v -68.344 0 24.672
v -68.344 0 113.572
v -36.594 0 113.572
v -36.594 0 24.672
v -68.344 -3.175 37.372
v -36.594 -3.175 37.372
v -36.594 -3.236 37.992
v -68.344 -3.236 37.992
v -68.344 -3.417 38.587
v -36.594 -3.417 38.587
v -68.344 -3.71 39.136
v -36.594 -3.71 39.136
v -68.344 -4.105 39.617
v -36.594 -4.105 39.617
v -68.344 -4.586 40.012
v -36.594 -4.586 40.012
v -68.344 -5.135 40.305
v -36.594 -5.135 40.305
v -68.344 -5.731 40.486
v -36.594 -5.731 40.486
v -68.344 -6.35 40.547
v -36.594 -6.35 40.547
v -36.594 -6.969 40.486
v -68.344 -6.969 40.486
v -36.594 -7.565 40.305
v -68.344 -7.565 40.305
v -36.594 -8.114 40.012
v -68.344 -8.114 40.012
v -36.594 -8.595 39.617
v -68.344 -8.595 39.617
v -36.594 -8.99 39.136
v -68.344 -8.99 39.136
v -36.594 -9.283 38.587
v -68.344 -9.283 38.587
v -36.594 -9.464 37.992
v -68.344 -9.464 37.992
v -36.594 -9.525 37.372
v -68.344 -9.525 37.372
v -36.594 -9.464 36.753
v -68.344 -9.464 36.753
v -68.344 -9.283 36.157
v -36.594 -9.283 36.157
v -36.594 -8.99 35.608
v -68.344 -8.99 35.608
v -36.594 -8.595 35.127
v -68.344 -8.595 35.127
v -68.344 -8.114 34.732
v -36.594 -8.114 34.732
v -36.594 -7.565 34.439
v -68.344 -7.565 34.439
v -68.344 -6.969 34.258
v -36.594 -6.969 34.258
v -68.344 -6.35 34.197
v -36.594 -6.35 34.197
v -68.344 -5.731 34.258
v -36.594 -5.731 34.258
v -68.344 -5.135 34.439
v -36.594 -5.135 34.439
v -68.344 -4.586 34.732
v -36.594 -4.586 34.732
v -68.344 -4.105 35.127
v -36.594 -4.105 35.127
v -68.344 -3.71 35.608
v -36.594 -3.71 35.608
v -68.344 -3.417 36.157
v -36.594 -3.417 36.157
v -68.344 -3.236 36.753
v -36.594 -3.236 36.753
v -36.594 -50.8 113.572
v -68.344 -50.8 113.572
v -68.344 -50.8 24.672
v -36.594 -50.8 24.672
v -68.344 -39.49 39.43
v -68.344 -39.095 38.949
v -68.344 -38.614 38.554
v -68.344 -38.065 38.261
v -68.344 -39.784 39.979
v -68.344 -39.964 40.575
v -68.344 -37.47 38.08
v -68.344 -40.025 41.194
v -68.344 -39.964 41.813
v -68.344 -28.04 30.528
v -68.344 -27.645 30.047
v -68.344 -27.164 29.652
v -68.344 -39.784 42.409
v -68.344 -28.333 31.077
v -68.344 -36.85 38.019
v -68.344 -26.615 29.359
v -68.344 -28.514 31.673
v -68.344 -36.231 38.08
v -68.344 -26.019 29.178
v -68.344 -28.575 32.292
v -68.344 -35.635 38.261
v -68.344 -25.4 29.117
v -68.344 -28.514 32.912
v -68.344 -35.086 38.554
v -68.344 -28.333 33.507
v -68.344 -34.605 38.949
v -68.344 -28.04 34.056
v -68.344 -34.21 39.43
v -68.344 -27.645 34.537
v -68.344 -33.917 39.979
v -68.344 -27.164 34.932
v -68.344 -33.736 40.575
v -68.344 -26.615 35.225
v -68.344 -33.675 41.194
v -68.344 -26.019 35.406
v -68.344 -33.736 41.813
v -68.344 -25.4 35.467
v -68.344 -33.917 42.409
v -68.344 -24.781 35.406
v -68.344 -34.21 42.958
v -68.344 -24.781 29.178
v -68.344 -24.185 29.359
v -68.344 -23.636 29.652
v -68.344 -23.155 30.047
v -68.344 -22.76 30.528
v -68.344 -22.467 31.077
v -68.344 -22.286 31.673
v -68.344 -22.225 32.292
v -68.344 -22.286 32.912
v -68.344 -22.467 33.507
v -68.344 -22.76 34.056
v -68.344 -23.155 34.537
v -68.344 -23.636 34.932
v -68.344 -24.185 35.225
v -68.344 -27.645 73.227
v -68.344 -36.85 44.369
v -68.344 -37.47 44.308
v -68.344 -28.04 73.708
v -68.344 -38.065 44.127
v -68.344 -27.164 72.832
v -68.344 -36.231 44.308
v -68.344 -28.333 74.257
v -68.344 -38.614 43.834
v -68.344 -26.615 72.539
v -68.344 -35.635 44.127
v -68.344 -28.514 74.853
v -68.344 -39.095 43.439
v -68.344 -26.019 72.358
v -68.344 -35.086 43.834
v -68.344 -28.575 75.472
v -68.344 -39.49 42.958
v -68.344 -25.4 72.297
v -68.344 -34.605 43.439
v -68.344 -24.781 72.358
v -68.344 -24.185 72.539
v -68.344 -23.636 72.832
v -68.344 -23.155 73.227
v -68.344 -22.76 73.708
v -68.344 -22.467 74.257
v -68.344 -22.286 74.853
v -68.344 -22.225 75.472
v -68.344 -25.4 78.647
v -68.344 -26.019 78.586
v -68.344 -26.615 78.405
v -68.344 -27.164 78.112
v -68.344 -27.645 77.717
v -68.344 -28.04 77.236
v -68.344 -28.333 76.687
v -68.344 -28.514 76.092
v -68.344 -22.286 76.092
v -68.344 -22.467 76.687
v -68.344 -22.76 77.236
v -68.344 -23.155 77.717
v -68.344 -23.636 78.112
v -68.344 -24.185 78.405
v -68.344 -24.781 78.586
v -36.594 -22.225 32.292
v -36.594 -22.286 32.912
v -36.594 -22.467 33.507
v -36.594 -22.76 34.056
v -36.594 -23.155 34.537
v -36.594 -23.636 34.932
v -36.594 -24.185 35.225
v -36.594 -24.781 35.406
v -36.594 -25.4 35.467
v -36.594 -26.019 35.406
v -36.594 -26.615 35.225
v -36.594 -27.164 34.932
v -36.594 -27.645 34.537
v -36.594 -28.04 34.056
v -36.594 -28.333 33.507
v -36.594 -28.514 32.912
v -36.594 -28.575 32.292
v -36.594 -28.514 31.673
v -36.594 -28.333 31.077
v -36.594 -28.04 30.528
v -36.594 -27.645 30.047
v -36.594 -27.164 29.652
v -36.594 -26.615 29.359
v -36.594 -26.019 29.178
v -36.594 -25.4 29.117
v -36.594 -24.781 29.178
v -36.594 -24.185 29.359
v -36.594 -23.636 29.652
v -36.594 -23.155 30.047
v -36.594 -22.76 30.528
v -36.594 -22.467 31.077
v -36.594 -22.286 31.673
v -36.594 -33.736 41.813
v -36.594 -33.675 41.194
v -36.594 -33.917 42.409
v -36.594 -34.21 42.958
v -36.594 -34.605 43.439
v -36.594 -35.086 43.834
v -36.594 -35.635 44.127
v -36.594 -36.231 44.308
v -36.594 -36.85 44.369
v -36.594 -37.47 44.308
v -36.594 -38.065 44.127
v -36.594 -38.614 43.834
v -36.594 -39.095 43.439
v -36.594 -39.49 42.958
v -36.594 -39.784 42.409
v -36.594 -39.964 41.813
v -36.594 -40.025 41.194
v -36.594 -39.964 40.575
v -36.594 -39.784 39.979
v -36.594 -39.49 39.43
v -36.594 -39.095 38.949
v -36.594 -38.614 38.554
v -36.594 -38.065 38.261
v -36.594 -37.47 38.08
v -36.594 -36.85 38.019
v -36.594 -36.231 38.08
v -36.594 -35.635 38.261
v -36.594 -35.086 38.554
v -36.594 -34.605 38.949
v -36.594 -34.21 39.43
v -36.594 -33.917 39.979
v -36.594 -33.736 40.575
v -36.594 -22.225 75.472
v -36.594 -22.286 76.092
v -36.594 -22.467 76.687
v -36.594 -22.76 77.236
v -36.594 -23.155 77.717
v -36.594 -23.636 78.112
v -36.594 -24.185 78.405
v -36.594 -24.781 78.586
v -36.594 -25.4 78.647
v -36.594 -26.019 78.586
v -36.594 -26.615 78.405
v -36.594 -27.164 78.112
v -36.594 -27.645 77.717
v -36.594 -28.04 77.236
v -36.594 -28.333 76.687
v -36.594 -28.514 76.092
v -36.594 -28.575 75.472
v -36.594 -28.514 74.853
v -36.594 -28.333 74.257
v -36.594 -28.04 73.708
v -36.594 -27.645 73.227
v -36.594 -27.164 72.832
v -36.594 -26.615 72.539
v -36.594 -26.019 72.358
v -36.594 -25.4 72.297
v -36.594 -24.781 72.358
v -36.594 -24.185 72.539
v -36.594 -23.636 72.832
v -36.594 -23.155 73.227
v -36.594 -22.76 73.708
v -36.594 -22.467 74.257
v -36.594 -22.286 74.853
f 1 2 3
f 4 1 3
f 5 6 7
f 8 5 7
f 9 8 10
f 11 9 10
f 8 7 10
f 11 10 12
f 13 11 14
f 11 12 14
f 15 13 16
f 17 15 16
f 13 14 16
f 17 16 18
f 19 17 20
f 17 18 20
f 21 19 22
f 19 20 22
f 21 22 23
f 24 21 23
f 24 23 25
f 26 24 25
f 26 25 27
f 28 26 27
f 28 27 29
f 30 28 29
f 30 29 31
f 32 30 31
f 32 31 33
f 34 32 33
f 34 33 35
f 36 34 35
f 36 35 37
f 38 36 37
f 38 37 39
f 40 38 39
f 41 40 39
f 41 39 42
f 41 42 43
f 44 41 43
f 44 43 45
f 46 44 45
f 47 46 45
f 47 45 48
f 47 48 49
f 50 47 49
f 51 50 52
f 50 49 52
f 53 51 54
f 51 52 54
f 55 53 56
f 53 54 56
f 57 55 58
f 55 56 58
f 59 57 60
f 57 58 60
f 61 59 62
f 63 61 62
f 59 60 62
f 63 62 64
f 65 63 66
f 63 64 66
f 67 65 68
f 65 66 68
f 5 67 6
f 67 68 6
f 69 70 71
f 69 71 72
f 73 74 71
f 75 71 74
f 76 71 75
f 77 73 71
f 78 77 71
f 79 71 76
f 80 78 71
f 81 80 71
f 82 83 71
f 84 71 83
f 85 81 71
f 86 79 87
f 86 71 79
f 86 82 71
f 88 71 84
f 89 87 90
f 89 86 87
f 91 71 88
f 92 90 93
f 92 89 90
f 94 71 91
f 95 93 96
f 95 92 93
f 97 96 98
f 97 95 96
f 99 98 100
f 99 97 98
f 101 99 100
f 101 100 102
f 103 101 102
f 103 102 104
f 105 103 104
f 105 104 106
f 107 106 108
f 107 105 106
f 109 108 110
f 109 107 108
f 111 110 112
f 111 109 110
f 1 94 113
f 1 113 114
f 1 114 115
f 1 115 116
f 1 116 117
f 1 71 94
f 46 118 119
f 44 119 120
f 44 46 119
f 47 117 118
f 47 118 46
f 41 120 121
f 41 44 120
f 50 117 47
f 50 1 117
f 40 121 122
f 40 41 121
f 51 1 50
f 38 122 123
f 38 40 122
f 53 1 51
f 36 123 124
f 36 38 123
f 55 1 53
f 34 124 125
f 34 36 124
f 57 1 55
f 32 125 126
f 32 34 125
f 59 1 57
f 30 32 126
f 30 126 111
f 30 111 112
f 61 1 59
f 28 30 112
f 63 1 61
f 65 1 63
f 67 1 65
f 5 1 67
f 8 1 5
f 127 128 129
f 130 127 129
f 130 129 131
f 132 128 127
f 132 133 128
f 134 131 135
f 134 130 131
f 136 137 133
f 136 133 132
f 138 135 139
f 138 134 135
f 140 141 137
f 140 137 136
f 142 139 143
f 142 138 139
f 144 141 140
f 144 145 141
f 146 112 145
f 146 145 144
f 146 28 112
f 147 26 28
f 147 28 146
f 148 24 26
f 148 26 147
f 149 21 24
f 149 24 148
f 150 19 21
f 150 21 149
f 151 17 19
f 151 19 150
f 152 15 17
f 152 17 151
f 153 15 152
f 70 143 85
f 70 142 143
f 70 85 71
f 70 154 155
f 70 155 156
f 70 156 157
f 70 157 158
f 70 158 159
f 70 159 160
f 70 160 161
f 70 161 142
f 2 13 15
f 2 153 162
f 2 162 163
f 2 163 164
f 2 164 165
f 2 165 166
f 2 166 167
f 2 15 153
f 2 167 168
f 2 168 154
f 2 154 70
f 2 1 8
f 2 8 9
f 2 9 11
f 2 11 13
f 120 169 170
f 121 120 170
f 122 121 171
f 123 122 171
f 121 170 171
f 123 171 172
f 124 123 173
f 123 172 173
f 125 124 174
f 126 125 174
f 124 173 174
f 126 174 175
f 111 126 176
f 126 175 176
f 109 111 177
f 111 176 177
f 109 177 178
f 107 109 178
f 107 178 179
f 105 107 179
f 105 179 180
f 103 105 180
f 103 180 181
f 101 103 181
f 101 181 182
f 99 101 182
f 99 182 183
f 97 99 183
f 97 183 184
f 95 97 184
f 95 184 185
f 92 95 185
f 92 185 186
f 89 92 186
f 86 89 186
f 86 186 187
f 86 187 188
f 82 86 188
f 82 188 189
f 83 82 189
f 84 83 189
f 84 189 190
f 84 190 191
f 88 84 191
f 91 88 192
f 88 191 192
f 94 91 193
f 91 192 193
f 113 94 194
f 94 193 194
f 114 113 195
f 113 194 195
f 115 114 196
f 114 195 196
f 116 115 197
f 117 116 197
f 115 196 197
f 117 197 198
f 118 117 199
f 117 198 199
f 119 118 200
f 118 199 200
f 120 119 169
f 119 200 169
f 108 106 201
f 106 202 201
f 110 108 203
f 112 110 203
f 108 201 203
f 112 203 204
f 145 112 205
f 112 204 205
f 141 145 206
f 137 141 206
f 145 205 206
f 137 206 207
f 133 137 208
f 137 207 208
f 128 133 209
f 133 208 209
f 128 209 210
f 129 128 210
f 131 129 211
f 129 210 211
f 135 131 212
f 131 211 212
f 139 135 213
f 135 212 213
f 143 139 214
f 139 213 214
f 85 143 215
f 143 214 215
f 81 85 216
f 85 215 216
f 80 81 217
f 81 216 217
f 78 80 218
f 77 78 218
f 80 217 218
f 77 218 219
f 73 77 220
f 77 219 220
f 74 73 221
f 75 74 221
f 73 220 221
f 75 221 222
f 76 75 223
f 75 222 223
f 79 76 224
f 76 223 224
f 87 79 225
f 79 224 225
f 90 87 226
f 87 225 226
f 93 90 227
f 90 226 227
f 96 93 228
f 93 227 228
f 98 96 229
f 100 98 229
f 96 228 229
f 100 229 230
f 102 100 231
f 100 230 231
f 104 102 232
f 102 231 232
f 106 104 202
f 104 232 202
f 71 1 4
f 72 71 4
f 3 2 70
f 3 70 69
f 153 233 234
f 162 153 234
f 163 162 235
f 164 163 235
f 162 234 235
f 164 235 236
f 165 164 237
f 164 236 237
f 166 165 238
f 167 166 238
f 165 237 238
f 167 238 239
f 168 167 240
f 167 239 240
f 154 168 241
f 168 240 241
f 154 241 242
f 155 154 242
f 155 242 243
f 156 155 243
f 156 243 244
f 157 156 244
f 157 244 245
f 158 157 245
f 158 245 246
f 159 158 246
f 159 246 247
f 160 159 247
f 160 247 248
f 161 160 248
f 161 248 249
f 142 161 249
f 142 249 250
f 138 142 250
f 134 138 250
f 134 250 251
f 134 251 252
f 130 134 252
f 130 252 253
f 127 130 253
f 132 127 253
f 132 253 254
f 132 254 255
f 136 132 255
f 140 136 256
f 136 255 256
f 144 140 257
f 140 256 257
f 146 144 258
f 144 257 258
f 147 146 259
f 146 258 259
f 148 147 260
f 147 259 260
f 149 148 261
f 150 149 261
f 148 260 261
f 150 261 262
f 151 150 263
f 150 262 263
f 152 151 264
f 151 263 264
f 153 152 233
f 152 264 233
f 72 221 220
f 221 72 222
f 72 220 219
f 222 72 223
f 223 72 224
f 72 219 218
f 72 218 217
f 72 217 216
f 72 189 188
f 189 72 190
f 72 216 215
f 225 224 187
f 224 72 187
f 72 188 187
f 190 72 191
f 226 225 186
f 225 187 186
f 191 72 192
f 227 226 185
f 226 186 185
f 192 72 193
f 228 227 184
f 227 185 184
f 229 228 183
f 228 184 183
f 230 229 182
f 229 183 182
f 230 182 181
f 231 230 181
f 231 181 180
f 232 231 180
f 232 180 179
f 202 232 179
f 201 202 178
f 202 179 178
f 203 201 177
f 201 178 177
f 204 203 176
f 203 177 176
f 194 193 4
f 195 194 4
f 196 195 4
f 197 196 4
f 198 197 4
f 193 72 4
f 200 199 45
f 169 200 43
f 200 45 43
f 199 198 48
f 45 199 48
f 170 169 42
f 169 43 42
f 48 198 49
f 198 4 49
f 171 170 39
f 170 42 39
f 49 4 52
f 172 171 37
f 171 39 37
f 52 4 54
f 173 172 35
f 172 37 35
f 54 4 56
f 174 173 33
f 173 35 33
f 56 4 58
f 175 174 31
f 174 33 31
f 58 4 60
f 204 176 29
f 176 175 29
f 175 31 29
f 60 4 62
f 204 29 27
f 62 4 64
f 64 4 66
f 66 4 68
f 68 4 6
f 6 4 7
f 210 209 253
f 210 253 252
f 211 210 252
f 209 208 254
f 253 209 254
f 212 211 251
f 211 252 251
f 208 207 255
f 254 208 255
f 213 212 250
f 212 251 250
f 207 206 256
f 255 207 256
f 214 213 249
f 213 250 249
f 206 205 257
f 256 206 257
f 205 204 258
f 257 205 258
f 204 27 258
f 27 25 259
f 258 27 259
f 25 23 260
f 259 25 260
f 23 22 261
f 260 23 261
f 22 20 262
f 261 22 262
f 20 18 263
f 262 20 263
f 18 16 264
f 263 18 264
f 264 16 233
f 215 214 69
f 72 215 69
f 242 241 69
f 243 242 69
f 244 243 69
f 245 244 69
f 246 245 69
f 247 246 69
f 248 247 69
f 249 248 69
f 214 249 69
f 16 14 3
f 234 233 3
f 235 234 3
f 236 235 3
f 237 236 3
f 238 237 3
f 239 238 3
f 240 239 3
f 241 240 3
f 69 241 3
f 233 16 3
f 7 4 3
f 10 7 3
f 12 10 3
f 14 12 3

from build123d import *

# Parameters (mm, degrees)
F0_W     = 31.75
F0_H     = 88.9
F1_DEPTH = 50.8
F2_R     = 3.175
F3_DEPTH = 76.2
F4_R     = 3.175
F5_DEPTH = 25.4
F6_DEPTH = 38.1


with BuildPart() as f1:
    # F0 (on Front) → F1 (new body)
    with BuildSketch(Plane.XZ):
        with Locations((-52.468664, 69.122105)):
            Rectangle(F0_W, F0_H)
    extrude(amount=F1_DEPTH)

    # F2 (on face) → F3 (cut)
    with BuildSketch(Plane.YZ.offset(-36.593664)):
        with Locations((-25.4, 75.472105)):
            Circle(F2_R)
        with Locations((-25.4, 32.292105)):
            Circle(F2_R)
        with Locations((-6.35, 37.372105)):
            Circle(F2_R)
    extrude(amount=-F3_DEPTH, mode=Mode.SUBTRACT)

    # F4 (on face) → F5 (cut)
    with BuildSketch(Plane.YZ.offset(-36.593664)):
        with Locations((-36.850315, 41.194014)):
            Circle(F4_R)
    extrude(amount=-F5_DEPTH, mode=Mode.SUBTRACT)

    # F4 (on face) → F6 (cut)
    with BuildSketch(Plane.YZ.offset(-36.593664)):
        with Locations((-36.850315, 41.194014)):
            Circle(F4_R)
    extrude(amount=-F6_DEPTH, mode=Mode.SUBTRACT)


solid = f1.part
